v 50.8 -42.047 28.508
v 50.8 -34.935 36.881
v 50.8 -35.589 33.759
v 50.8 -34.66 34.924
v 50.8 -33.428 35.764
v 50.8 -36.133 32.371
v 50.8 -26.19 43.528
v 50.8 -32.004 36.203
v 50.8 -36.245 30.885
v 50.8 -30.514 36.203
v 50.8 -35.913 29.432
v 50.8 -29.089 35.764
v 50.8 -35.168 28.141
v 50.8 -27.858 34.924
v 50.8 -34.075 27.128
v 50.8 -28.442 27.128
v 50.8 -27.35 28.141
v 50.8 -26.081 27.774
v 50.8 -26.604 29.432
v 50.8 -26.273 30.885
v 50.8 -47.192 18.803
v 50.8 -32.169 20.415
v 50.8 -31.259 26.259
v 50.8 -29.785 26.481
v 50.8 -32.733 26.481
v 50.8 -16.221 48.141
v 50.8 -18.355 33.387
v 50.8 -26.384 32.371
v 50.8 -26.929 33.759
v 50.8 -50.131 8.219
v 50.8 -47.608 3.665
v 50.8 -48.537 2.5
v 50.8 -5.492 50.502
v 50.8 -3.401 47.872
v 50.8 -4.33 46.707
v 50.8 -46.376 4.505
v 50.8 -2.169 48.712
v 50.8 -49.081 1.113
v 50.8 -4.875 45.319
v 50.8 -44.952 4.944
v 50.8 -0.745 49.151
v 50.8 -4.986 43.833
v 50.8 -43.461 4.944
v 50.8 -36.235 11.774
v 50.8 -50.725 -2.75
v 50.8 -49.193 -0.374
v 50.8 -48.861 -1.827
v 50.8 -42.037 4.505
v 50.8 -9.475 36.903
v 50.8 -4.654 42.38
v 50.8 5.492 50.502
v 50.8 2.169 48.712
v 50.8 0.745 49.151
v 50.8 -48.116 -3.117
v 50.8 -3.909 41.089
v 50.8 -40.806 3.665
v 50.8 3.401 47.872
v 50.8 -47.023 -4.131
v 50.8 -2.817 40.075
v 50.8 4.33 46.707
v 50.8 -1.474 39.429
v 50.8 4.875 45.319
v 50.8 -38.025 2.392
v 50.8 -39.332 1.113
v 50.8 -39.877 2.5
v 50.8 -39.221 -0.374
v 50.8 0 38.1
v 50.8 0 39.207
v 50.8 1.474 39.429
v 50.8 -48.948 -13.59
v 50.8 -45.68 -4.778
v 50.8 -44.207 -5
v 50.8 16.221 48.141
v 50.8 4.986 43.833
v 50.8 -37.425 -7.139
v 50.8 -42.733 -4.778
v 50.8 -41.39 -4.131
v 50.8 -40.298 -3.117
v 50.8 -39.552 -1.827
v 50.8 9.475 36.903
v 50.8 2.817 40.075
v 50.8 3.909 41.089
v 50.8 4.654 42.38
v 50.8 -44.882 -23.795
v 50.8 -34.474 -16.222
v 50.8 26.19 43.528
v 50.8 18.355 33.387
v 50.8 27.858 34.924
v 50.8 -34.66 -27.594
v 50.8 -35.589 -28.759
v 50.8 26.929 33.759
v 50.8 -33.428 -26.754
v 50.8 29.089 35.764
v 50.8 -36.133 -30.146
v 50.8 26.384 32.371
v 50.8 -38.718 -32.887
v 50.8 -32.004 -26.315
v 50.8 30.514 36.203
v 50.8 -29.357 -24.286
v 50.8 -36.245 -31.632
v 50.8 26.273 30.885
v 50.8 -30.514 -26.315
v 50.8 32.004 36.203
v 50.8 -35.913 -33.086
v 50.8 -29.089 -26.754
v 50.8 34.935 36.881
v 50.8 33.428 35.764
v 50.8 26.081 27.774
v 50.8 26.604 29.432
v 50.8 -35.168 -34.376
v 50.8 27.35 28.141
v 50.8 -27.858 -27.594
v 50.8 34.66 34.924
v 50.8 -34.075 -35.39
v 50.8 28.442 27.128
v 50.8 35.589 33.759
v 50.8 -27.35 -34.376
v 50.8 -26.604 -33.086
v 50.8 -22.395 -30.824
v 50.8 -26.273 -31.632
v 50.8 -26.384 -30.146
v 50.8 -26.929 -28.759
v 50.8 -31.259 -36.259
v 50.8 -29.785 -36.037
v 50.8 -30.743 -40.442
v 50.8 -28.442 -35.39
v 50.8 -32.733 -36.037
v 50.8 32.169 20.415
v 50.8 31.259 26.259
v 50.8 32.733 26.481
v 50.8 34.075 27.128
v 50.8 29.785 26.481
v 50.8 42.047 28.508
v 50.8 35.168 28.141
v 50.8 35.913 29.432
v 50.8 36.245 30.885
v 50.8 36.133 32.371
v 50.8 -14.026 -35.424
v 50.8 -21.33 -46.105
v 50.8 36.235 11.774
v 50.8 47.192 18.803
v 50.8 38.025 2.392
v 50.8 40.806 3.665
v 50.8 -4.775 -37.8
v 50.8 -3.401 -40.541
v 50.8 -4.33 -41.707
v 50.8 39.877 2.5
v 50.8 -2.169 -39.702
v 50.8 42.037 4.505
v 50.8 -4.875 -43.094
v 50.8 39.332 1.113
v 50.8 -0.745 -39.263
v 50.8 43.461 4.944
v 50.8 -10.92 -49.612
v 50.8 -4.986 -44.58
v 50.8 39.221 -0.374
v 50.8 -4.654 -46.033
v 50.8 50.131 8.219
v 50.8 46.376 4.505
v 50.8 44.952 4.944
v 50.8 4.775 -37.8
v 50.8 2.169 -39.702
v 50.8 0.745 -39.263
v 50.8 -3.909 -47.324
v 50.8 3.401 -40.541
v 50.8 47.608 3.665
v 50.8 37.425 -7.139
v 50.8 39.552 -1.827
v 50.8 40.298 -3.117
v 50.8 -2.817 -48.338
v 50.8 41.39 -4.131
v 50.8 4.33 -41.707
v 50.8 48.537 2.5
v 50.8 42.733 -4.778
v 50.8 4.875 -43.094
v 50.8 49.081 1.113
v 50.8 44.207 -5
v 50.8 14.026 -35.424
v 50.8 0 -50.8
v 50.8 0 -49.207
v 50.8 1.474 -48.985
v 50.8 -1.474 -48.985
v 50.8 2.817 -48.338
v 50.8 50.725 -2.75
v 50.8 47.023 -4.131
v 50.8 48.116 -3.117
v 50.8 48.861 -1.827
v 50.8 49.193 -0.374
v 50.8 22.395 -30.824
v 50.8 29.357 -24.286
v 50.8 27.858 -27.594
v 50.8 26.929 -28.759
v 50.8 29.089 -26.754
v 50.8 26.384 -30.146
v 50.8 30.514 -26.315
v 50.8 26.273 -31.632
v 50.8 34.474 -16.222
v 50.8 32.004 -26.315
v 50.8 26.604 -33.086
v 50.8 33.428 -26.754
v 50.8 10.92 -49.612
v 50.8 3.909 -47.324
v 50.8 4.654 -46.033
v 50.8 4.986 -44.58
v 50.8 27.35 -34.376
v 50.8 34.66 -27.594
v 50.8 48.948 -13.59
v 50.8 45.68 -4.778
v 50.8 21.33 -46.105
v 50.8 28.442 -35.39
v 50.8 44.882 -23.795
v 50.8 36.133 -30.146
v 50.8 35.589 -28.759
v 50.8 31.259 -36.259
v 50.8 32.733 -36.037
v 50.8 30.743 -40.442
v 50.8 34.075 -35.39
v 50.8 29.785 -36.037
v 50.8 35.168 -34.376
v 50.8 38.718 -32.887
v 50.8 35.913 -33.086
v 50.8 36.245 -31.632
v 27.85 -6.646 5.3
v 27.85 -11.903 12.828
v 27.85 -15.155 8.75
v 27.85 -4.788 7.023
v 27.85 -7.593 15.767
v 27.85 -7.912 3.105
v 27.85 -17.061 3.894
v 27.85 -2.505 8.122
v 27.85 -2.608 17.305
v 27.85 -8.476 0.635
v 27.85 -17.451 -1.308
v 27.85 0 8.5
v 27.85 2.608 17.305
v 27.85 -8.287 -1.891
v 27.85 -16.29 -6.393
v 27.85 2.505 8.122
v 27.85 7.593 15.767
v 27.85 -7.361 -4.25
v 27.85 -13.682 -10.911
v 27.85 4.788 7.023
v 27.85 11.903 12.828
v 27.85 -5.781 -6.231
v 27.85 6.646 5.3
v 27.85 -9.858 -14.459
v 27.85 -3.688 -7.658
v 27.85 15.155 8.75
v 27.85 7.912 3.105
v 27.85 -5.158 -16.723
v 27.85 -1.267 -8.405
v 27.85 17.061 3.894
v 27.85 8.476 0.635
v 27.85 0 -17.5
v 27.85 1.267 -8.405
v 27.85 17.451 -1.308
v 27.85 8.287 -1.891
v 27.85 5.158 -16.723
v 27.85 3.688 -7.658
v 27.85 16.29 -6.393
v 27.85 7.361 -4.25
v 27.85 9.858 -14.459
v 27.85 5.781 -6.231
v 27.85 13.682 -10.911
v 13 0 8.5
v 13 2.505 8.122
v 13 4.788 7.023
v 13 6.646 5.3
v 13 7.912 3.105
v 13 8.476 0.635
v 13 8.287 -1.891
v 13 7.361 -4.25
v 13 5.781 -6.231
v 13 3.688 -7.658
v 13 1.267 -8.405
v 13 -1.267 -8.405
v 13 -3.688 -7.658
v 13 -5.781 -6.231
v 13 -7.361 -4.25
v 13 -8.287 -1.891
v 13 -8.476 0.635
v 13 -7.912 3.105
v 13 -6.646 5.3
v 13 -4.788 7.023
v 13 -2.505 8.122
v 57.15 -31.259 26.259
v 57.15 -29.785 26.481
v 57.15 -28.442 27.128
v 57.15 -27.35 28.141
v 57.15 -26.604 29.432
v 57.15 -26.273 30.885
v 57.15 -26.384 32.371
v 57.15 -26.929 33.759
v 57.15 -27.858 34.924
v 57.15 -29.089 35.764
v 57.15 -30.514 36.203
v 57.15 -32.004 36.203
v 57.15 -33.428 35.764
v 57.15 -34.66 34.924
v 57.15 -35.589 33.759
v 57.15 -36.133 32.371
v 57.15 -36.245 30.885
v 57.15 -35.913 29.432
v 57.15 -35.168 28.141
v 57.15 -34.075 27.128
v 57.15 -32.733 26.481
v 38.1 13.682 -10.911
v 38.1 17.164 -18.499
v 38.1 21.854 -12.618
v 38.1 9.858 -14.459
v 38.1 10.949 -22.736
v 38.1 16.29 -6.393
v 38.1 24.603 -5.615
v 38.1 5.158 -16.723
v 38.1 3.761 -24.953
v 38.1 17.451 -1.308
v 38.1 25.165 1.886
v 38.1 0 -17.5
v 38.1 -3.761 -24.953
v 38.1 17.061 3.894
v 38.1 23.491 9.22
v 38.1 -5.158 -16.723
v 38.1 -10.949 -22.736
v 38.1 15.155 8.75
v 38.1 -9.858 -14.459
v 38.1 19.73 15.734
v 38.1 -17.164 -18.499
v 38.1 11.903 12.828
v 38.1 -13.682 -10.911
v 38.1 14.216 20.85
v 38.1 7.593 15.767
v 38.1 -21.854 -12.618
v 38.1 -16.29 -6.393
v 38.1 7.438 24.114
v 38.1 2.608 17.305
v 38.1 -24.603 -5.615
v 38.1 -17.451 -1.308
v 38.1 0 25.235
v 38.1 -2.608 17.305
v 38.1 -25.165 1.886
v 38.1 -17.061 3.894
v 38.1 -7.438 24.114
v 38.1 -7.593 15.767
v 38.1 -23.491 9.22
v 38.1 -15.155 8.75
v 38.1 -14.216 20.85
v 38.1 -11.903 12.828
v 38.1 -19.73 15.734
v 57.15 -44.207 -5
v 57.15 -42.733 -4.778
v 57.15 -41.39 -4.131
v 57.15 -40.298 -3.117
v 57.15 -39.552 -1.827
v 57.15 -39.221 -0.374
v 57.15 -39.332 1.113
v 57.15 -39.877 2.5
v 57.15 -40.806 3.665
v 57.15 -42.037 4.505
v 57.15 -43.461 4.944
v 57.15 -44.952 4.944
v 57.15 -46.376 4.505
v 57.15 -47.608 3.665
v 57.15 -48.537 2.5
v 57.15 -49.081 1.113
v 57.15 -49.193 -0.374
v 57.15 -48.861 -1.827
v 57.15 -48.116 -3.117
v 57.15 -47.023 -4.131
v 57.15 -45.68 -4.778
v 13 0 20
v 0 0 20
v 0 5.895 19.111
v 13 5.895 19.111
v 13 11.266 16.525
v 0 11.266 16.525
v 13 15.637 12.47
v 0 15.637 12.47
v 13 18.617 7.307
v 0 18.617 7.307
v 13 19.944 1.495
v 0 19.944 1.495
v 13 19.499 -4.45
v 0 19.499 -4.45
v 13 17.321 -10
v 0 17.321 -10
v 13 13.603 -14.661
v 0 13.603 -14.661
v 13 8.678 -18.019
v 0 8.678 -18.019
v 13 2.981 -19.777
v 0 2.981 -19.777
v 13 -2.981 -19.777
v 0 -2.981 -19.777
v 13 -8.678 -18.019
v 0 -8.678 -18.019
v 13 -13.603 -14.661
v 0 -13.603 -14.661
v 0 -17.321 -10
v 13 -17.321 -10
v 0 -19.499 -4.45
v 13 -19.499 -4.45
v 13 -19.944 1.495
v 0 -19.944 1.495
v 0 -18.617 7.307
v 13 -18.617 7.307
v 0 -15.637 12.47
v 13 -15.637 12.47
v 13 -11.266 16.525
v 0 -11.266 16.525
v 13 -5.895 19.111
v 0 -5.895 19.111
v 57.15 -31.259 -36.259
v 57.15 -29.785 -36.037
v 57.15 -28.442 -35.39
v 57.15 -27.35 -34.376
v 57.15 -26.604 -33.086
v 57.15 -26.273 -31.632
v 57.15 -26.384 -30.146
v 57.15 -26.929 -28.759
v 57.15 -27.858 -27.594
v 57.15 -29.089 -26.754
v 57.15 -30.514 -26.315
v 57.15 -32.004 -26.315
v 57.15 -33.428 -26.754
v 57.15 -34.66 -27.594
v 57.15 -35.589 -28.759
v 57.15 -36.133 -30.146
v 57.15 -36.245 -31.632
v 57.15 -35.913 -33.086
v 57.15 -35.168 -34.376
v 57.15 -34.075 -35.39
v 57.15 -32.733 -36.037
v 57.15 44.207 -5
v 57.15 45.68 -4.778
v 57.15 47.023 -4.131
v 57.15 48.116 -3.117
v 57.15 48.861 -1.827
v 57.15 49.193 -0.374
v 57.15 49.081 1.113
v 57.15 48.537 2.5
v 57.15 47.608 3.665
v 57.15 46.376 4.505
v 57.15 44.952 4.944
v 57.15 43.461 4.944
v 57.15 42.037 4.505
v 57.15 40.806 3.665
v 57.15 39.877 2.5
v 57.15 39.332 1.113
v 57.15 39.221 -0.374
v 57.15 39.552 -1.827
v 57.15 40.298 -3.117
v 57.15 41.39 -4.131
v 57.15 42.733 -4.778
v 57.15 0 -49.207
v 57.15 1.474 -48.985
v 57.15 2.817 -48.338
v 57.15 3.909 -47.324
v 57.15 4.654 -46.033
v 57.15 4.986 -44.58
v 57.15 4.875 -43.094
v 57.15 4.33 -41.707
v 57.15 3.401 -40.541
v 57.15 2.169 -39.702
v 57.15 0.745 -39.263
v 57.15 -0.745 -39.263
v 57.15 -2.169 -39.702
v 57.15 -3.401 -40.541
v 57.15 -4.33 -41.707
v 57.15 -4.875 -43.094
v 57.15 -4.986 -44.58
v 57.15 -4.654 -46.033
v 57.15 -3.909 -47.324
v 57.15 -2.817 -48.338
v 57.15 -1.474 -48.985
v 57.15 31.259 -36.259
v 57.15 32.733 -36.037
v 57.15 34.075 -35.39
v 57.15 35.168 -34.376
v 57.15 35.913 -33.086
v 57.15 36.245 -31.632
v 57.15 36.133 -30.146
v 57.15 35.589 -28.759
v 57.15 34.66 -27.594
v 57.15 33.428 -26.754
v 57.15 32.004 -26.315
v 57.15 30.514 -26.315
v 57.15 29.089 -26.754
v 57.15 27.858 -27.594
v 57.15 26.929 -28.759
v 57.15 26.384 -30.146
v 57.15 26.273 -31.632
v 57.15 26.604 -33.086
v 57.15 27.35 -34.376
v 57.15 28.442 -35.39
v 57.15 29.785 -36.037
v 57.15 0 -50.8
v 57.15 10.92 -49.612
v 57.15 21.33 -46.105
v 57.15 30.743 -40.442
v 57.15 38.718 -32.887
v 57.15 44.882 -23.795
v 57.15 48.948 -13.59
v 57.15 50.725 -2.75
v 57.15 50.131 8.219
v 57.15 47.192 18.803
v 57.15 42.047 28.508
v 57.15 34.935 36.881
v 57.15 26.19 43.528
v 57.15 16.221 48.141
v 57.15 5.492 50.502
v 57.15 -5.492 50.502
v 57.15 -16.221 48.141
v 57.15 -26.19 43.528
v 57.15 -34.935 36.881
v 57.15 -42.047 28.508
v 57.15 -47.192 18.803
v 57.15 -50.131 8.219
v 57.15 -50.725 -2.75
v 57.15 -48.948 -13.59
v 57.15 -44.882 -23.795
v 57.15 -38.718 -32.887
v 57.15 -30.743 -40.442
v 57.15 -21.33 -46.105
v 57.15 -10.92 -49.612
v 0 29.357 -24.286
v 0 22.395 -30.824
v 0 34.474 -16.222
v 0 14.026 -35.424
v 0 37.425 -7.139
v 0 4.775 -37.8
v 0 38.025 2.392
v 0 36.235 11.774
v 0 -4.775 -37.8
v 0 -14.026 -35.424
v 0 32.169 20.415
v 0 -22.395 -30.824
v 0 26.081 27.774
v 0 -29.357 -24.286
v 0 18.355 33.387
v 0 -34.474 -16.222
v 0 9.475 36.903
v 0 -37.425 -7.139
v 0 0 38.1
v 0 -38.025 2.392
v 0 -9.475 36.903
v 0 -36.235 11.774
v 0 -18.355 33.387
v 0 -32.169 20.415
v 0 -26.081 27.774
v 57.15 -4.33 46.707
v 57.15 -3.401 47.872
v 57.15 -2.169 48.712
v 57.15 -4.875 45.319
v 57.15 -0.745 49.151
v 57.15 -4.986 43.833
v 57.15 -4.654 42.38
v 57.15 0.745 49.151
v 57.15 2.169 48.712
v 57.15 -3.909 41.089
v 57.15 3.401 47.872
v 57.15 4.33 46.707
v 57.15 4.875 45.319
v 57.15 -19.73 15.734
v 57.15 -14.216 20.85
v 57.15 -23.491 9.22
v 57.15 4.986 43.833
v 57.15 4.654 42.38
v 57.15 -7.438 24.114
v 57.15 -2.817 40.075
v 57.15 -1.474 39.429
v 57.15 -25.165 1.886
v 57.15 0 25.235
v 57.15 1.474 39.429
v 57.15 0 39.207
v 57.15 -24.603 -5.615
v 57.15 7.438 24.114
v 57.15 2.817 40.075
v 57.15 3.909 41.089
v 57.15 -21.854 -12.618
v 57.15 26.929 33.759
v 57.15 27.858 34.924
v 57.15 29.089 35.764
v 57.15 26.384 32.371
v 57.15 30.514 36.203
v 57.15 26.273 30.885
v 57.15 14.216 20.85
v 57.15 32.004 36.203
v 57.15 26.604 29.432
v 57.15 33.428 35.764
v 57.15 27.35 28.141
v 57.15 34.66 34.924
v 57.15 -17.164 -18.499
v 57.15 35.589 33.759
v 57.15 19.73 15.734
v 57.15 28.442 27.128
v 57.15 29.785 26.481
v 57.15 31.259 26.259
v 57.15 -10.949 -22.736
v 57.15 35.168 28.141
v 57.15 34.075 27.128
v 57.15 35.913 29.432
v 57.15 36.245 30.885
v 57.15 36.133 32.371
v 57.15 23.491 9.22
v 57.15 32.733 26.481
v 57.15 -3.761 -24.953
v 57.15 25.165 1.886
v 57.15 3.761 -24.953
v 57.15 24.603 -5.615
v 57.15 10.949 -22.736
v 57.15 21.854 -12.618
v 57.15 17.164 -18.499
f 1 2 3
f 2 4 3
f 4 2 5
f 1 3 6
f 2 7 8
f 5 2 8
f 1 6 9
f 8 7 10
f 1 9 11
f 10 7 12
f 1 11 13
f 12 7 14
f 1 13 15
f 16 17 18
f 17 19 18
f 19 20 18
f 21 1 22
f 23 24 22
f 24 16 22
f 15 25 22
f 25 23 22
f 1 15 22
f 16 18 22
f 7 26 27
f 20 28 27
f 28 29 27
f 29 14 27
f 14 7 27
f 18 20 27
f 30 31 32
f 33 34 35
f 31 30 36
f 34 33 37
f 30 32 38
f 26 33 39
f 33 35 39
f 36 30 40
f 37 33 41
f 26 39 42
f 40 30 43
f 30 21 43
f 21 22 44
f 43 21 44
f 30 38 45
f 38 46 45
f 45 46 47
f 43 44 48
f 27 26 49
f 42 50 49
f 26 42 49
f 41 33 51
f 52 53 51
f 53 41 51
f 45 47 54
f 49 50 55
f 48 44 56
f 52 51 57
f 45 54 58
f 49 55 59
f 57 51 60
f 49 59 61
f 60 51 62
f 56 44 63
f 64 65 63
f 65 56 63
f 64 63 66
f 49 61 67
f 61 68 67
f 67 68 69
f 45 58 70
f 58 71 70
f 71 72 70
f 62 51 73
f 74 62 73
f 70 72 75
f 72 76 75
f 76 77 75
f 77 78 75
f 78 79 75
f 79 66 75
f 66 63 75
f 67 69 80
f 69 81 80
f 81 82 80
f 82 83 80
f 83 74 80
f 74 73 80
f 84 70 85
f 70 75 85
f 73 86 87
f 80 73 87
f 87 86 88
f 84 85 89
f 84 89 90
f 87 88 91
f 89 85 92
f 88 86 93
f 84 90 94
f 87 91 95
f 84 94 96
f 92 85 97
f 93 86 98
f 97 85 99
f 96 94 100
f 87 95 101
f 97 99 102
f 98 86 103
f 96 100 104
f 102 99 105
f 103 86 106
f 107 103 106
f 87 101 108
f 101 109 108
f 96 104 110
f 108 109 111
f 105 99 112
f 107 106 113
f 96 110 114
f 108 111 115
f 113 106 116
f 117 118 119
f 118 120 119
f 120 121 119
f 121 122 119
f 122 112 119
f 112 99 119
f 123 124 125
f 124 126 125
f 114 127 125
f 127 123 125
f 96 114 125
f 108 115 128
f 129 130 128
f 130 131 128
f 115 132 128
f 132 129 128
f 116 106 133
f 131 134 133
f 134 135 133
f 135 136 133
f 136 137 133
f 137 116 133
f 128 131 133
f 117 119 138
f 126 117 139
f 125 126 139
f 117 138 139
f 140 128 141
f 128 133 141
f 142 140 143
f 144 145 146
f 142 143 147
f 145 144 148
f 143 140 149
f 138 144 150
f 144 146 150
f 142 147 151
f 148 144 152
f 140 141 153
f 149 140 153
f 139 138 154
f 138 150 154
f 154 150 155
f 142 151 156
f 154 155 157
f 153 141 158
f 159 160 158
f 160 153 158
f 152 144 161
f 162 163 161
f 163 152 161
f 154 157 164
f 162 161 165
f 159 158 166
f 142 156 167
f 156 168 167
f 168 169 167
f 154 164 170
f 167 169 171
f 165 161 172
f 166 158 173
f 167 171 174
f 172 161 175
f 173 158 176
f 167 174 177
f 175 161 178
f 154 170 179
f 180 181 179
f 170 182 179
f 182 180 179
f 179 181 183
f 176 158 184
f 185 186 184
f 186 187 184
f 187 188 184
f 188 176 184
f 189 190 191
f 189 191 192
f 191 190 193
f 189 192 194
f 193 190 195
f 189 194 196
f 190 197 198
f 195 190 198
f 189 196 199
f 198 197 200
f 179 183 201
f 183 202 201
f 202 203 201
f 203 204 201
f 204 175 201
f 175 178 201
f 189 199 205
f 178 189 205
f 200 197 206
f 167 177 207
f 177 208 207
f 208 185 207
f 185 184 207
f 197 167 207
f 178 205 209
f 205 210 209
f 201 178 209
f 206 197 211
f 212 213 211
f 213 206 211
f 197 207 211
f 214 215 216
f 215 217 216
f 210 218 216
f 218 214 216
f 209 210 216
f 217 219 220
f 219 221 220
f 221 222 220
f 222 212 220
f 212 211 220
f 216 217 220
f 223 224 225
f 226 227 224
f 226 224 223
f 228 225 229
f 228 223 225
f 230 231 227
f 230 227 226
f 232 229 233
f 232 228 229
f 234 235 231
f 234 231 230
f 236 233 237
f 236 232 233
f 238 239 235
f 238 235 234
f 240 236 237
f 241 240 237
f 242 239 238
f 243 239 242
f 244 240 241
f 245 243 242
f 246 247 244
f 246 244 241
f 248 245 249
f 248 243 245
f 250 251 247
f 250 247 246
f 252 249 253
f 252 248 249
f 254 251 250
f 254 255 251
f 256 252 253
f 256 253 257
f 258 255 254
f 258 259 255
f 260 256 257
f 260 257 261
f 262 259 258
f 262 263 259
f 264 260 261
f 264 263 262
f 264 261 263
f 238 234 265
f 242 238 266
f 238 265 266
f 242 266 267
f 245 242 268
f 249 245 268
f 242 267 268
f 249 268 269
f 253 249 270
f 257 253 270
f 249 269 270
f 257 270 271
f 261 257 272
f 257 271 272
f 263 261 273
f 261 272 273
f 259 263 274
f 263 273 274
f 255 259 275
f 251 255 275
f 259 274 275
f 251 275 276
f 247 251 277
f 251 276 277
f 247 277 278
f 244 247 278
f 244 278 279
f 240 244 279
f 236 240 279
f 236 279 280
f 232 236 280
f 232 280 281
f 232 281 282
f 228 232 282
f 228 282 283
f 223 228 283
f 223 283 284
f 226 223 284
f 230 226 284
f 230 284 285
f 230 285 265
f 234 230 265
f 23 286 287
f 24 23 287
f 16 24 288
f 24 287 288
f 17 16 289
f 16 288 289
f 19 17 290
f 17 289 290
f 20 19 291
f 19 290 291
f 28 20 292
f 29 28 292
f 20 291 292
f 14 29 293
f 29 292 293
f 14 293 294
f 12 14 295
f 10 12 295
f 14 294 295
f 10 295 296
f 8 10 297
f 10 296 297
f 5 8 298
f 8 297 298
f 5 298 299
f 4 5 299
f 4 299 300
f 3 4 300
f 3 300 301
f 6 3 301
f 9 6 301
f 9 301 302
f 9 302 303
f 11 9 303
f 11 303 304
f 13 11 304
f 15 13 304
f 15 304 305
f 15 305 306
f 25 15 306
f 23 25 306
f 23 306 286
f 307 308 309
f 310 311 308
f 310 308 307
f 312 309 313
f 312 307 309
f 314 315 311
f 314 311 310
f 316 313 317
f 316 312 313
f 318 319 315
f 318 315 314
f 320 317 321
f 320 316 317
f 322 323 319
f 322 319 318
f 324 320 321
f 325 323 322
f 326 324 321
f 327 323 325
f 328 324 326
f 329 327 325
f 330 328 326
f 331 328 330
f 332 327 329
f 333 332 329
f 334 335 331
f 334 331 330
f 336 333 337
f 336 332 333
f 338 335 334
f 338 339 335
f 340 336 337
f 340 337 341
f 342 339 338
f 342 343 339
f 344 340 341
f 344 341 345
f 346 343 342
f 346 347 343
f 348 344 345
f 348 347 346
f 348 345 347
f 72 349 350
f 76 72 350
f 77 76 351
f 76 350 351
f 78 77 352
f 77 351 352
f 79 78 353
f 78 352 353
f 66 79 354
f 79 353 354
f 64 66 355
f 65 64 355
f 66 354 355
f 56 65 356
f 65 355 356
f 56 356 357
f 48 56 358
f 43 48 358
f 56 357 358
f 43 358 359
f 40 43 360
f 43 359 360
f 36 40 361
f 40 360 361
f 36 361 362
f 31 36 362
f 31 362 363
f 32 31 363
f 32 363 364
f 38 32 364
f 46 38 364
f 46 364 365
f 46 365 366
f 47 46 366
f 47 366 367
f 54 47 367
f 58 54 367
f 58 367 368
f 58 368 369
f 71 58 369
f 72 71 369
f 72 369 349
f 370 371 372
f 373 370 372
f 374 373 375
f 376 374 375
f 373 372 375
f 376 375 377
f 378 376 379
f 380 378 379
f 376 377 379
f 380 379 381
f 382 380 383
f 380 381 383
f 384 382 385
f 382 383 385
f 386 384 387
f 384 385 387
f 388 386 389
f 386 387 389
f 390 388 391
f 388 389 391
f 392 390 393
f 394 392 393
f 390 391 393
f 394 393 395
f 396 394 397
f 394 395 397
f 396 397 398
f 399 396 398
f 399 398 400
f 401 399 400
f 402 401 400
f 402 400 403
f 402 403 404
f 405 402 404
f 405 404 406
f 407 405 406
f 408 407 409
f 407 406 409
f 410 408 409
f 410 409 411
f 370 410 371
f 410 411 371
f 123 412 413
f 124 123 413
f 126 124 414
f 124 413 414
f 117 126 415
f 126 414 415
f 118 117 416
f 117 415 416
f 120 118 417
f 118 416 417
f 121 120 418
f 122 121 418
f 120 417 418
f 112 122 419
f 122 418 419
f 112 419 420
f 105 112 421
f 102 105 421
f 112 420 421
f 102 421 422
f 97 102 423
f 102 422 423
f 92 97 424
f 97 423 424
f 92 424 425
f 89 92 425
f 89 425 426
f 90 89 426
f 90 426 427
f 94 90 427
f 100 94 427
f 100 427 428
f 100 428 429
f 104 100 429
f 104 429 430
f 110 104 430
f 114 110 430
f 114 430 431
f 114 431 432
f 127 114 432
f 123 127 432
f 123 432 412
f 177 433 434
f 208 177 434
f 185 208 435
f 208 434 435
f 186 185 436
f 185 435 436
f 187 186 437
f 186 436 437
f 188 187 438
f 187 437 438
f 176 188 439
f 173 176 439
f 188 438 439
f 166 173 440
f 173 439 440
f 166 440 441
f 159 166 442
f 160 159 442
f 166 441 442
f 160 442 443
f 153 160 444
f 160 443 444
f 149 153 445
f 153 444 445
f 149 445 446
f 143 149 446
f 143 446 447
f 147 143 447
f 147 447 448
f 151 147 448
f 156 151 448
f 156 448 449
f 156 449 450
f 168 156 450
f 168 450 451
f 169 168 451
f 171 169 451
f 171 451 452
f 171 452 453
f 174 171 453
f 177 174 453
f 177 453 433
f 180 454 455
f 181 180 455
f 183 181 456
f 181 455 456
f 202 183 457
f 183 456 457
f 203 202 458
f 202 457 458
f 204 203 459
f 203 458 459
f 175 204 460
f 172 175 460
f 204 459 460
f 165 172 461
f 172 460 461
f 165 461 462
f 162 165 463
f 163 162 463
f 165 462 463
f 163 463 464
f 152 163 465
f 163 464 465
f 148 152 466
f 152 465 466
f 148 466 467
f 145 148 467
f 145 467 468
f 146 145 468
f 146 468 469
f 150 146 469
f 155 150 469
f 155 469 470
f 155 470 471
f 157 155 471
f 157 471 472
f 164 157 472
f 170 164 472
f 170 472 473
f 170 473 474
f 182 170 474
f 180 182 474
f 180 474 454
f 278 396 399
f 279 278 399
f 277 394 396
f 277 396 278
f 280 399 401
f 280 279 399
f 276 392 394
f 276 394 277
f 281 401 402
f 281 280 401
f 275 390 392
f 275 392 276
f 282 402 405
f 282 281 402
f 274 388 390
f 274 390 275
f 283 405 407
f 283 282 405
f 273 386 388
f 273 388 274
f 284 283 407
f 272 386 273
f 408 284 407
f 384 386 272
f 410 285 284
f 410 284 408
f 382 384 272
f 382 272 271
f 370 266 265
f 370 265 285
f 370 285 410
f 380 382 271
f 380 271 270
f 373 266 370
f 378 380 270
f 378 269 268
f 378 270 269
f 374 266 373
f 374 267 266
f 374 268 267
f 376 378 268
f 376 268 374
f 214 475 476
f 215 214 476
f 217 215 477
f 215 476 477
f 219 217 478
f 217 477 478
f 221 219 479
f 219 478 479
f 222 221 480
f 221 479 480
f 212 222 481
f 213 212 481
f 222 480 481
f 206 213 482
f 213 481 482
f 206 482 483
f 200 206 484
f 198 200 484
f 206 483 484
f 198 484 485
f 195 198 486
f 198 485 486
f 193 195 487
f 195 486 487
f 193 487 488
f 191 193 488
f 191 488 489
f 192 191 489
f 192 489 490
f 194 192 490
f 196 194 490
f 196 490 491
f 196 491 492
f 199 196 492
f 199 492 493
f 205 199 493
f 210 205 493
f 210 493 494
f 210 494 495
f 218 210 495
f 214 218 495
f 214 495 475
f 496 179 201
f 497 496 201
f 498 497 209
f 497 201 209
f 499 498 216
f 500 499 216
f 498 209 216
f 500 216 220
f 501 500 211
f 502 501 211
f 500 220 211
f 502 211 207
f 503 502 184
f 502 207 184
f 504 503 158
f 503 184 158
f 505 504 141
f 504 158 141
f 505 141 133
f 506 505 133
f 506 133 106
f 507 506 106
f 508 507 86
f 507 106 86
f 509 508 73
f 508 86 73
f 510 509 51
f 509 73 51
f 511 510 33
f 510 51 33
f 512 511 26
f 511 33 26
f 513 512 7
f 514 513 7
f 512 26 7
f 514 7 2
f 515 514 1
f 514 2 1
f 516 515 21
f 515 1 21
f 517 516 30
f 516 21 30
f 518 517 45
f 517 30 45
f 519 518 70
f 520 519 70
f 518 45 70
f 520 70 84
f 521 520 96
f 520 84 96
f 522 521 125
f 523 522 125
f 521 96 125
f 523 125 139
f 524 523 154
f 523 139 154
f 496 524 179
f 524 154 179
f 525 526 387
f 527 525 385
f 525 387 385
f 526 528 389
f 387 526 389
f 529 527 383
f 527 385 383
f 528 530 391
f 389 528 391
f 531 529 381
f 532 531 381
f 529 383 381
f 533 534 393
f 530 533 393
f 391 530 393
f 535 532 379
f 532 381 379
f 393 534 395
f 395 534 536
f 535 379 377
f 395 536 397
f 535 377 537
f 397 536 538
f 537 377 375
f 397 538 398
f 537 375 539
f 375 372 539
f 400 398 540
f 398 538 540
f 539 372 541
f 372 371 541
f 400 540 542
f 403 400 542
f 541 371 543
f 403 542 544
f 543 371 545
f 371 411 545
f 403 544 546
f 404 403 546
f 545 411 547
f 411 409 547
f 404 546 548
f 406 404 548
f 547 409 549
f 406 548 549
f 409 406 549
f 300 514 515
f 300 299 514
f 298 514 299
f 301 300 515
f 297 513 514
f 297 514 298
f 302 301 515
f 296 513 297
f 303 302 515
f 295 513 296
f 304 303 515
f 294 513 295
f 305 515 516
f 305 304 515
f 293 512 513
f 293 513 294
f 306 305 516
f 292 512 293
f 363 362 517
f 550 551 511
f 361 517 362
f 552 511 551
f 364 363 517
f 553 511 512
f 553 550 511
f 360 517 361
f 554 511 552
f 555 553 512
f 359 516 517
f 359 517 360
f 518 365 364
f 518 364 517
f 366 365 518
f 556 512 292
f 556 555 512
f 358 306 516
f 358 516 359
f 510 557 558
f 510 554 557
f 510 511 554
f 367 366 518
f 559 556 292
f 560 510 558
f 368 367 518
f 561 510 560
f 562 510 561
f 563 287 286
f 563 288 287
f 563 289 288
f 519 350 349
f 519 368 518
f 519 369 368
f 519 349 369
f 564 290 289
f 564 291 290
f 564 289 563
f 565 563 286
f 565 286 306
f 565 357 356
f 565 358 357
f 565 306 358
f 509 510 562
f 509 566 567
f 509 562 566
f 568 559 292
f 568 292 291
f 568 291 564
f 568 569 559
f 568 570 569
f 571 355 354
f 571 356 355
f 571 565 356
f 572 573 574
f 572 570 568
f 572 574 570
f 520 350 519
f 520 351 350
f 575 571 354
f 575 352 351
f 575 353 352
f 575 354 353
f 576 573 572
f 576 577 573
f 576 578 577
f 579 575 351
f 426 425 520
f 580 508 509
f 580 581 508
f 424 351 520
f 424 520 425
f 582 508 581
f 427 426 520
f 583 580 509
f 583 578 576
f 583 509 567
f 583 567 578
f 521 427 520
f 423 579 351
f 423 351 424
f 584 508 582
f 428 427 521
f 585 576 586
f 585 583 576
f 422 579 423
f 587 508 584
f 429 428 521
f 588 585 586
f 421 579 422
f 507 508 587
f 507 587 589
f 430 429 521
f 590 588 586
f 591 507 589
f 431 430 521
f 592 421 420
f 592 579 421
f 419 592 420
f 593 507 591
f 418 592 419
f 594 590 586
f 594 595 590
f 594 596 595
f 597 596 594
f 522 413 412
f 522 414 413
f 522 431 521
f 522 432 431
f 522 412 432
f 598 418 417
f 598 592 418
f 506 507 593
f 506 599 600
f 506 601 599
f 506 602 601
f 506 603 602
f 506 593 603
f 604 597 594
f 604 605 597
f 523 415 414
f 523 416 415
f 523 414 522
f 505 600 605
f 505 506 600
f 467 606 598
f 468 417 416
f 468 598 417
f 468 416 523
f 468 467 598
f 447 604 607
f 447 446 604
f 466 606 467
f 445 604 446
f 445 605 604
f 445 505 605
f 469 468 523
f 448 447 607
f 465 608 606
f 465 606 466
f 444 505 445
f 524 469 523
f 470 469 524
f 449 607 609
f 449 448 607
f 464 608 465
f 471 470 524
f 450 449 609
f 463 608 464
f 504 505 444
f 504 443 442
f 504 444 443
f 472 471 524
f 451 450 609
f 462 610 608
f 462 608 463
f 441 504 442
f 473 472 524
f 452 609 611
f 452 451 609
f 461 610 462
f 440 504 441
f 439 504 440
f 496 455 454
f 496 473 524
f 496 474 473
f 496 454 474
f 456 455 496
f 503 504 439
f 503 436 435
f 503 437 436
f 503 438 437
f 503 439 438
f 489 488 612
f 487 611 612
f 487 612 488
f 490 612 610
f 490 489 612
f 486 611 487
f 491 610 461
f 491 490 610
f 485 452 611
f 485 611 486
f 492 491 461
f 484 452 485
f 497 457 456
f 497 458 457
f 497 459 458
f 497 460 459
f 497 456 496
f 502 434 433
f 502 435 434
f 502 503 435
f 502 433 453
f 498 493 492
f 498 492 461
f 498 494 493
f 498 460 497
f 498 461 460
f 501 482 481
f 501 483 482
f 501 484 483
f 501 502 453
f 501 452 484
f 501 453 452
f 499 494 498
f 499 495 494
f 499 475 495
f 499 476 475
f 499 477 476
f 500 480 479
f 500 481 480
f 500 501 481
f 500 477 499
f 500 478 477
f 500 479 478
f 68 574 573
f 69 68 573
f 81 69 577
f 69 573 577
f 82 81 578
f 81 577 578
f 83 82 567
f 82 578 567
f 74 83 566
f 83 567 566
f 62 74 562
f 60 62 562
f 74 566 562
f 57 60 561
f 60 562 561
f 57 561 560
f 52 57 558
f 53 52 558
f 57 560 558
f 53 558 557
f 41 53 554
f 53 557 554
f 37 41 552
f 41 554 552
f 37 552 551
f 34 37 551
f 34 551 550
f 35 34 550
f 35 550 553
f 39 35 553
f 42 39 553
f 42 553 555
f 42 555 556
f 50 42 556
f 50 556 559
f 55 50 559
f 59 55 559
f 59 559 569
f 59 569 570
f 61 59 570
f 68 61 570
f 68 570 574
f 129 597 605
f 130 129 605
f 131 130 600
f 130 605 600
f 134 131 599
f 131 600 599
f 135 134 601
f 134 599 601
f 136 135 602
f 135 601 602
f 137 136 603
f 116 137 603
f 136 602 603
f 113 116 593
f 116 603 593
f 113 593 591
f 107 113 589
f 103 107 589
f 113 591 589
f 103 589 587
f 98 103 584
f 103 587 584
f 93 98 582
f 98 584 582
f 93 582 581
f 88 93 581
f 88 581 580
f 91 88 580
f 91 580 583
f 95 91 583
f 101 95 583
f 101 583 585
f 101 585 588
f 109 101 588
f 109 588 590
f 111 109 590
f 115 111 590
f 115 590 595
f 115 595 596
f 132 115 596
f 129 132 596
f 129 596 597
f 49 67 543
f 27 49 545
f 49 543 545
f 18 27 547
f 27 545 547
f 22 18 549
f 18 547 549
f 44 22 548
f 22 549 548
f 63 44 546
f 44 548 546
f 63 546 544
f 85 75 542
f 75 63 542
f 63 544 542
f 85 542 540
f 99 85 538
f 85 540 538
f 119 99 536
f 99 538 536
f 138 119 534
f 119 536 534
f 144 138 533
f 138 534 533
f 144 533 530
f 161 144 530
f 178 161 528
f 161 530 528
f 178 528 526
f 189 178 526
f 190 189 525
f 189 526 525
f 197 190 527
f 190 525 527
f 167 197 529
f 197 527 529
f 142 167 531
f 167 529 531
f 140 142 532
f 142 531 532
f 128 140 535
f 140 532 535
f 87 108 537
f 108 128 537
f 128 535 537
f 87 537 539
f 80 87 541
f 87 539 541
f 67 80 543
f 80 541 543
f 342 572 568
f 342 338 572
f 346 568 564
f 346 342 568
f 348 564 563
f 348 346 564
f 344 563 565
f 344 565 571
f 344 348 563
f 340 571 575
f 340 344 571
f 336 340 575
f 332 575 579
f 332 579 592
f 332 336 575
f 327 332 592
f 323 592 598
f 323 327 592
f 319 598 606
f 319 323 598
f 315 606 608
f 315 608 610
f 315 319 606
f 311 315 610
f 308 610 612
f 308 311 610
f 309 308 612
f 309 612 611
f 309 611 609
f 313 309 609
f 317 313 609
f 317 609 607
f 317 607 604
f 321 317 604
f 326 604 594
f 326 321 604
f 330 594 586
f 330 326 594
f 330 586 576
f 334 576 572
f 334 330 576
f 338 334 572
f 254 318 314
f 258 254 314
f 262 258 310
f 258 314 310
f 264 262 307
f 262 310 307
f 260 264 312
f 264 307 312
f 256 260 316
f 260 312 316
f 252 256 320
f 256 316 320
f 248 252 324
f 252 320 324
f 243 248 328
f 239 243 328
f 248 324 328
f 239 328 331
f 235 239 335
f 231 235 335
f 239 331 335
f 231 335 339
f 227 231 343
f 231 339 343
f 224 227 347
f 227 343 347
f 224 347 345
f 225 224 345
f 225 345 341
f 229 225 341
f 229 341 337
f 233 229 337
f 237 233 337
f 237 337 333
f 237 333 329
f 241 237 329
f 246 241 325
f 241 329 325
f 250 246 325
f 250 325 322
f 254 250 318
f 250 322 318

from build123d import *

# Parameters (mm, degrees)
SKETCH1_R              = 38.1
BOSS_EXTRUDE1_DEPTH    = 38.1
SKETCH2_R              = 17.5
CUT_EXTRUDE1_DEPTH     = 10.25
F_25_0MM_DOWEL_HOLE1_D = 17
SKETCH14_R             = 38.1
SKETCH14_R_2           = 25.235346295
BOSS_EXTRUDE3_DEPTH    = 19.05
BOSS_EXTRUDE2_START    = -6.35
SKETCH7_R              = 50.8
SKETCH7_R_2            = 25.235346295
BOSS_EXTRUDE2_DEPTH    = 6.35
SKETCH8_R              = 20
CUT_EXTRUDE2_DEPTH     = 13
M8_CLEARANCE_HOLE1_D   = 10


with BuildPart() as part:
    # Sketch1 → Boss-Extrude1 (new body)
    with BuildSketch(Plane(origin=(0, 0, 0), x_dir=(0, 0, -1), z_dir=(1, 0, 0))):
        with Locations(Location((0, 0, 0), (0, 0, 180))):
            Circle(SKETCH1_R)
    extrude(amount=BOSS_EXTRUDE1_DEPTH)

    # Sketch2 → Cut-Extrude1 (cut)
    with BuildSketch(Plane(origin=(38.1, 0, 0), x_dir=(0, 0, -1), z_dir=(1, 0, 0))):
        Circle(SKETCH2_R)
    extrude(amount=-CUT_EXTRUDE1_DEPTH, mode=Mode.SUBTRACT)

    # Ø25.0mm Dowel Hole1 (through all)
    with Locations(Plane(origin=(27.85, 0, 0), x_dir=(0, 0, -1), z_dir=(1, 0, 0))):
        with Locations((0, 0)):
            Hole(F_25_0MM_DOWEL_HOLE1_D / 2)

    # Sketch14 → Boss-Extrude3 (add)
    with BuildSketch(Plane(origin=(38.1, 0, 0), x_dir=(0, 0, -1), z_dir=(1, 0, 0))):
        with Locations(Location((0, 0, 0), (0, 0, 180))):
            Circle(SKETCH14_R)
        with Locations(Location((0, 0, 0), (0, 0, 180))):
            Circle(SKETCH14_R_2, mode=Mode.SUBTRACT)
    extrude(amount=BOSS_EXTRUDE3_DEPTH)

    # Sketch7 → Boss-Extrude2 (add)
    with BuildSketch(Plane(origin=(57.15, 0, 0), x_dir=(0, 0, -1), z_dir=(1, 0, 0)).offset(BOSS_EXTRUDE2_START)):
        Circle(SKETCH7_R)
        with Locations(Location((0, 0, 0), (0, 0, 180))):
            Circle(SKETCH7_R_2, mode=Mode.SUBTRACT)
    extrude(amount=BOSS_EXTRUDE2_DEPTH)

    # Sketch8 → Cut-Extrude2 (cut)
    with BuildSketch(Plane.ZY):
        Circle(SKETCH8_R)
    extrude(amount=-CUT_EXTRUDE2_DEPTH, mode=Mode.SUBTRACT)

    # M8 Clearance Hole1 (through all)
    with Locations(Plane.ZY.offset(-50.8)):
        with Locations((-44.206688043, 0), (-31.258848889, 31.258848889), (0, 44.206688043), (31.258848889, 31.258848889), (44.206688043, 0), (31.258848889, -31.258848889), (0, -44.206688043), (-31.258848889, -31.258848889), (0, 0)):
            Hole(M8_CLEARANCE_HOLE1_D / 2)


solid = part.part
